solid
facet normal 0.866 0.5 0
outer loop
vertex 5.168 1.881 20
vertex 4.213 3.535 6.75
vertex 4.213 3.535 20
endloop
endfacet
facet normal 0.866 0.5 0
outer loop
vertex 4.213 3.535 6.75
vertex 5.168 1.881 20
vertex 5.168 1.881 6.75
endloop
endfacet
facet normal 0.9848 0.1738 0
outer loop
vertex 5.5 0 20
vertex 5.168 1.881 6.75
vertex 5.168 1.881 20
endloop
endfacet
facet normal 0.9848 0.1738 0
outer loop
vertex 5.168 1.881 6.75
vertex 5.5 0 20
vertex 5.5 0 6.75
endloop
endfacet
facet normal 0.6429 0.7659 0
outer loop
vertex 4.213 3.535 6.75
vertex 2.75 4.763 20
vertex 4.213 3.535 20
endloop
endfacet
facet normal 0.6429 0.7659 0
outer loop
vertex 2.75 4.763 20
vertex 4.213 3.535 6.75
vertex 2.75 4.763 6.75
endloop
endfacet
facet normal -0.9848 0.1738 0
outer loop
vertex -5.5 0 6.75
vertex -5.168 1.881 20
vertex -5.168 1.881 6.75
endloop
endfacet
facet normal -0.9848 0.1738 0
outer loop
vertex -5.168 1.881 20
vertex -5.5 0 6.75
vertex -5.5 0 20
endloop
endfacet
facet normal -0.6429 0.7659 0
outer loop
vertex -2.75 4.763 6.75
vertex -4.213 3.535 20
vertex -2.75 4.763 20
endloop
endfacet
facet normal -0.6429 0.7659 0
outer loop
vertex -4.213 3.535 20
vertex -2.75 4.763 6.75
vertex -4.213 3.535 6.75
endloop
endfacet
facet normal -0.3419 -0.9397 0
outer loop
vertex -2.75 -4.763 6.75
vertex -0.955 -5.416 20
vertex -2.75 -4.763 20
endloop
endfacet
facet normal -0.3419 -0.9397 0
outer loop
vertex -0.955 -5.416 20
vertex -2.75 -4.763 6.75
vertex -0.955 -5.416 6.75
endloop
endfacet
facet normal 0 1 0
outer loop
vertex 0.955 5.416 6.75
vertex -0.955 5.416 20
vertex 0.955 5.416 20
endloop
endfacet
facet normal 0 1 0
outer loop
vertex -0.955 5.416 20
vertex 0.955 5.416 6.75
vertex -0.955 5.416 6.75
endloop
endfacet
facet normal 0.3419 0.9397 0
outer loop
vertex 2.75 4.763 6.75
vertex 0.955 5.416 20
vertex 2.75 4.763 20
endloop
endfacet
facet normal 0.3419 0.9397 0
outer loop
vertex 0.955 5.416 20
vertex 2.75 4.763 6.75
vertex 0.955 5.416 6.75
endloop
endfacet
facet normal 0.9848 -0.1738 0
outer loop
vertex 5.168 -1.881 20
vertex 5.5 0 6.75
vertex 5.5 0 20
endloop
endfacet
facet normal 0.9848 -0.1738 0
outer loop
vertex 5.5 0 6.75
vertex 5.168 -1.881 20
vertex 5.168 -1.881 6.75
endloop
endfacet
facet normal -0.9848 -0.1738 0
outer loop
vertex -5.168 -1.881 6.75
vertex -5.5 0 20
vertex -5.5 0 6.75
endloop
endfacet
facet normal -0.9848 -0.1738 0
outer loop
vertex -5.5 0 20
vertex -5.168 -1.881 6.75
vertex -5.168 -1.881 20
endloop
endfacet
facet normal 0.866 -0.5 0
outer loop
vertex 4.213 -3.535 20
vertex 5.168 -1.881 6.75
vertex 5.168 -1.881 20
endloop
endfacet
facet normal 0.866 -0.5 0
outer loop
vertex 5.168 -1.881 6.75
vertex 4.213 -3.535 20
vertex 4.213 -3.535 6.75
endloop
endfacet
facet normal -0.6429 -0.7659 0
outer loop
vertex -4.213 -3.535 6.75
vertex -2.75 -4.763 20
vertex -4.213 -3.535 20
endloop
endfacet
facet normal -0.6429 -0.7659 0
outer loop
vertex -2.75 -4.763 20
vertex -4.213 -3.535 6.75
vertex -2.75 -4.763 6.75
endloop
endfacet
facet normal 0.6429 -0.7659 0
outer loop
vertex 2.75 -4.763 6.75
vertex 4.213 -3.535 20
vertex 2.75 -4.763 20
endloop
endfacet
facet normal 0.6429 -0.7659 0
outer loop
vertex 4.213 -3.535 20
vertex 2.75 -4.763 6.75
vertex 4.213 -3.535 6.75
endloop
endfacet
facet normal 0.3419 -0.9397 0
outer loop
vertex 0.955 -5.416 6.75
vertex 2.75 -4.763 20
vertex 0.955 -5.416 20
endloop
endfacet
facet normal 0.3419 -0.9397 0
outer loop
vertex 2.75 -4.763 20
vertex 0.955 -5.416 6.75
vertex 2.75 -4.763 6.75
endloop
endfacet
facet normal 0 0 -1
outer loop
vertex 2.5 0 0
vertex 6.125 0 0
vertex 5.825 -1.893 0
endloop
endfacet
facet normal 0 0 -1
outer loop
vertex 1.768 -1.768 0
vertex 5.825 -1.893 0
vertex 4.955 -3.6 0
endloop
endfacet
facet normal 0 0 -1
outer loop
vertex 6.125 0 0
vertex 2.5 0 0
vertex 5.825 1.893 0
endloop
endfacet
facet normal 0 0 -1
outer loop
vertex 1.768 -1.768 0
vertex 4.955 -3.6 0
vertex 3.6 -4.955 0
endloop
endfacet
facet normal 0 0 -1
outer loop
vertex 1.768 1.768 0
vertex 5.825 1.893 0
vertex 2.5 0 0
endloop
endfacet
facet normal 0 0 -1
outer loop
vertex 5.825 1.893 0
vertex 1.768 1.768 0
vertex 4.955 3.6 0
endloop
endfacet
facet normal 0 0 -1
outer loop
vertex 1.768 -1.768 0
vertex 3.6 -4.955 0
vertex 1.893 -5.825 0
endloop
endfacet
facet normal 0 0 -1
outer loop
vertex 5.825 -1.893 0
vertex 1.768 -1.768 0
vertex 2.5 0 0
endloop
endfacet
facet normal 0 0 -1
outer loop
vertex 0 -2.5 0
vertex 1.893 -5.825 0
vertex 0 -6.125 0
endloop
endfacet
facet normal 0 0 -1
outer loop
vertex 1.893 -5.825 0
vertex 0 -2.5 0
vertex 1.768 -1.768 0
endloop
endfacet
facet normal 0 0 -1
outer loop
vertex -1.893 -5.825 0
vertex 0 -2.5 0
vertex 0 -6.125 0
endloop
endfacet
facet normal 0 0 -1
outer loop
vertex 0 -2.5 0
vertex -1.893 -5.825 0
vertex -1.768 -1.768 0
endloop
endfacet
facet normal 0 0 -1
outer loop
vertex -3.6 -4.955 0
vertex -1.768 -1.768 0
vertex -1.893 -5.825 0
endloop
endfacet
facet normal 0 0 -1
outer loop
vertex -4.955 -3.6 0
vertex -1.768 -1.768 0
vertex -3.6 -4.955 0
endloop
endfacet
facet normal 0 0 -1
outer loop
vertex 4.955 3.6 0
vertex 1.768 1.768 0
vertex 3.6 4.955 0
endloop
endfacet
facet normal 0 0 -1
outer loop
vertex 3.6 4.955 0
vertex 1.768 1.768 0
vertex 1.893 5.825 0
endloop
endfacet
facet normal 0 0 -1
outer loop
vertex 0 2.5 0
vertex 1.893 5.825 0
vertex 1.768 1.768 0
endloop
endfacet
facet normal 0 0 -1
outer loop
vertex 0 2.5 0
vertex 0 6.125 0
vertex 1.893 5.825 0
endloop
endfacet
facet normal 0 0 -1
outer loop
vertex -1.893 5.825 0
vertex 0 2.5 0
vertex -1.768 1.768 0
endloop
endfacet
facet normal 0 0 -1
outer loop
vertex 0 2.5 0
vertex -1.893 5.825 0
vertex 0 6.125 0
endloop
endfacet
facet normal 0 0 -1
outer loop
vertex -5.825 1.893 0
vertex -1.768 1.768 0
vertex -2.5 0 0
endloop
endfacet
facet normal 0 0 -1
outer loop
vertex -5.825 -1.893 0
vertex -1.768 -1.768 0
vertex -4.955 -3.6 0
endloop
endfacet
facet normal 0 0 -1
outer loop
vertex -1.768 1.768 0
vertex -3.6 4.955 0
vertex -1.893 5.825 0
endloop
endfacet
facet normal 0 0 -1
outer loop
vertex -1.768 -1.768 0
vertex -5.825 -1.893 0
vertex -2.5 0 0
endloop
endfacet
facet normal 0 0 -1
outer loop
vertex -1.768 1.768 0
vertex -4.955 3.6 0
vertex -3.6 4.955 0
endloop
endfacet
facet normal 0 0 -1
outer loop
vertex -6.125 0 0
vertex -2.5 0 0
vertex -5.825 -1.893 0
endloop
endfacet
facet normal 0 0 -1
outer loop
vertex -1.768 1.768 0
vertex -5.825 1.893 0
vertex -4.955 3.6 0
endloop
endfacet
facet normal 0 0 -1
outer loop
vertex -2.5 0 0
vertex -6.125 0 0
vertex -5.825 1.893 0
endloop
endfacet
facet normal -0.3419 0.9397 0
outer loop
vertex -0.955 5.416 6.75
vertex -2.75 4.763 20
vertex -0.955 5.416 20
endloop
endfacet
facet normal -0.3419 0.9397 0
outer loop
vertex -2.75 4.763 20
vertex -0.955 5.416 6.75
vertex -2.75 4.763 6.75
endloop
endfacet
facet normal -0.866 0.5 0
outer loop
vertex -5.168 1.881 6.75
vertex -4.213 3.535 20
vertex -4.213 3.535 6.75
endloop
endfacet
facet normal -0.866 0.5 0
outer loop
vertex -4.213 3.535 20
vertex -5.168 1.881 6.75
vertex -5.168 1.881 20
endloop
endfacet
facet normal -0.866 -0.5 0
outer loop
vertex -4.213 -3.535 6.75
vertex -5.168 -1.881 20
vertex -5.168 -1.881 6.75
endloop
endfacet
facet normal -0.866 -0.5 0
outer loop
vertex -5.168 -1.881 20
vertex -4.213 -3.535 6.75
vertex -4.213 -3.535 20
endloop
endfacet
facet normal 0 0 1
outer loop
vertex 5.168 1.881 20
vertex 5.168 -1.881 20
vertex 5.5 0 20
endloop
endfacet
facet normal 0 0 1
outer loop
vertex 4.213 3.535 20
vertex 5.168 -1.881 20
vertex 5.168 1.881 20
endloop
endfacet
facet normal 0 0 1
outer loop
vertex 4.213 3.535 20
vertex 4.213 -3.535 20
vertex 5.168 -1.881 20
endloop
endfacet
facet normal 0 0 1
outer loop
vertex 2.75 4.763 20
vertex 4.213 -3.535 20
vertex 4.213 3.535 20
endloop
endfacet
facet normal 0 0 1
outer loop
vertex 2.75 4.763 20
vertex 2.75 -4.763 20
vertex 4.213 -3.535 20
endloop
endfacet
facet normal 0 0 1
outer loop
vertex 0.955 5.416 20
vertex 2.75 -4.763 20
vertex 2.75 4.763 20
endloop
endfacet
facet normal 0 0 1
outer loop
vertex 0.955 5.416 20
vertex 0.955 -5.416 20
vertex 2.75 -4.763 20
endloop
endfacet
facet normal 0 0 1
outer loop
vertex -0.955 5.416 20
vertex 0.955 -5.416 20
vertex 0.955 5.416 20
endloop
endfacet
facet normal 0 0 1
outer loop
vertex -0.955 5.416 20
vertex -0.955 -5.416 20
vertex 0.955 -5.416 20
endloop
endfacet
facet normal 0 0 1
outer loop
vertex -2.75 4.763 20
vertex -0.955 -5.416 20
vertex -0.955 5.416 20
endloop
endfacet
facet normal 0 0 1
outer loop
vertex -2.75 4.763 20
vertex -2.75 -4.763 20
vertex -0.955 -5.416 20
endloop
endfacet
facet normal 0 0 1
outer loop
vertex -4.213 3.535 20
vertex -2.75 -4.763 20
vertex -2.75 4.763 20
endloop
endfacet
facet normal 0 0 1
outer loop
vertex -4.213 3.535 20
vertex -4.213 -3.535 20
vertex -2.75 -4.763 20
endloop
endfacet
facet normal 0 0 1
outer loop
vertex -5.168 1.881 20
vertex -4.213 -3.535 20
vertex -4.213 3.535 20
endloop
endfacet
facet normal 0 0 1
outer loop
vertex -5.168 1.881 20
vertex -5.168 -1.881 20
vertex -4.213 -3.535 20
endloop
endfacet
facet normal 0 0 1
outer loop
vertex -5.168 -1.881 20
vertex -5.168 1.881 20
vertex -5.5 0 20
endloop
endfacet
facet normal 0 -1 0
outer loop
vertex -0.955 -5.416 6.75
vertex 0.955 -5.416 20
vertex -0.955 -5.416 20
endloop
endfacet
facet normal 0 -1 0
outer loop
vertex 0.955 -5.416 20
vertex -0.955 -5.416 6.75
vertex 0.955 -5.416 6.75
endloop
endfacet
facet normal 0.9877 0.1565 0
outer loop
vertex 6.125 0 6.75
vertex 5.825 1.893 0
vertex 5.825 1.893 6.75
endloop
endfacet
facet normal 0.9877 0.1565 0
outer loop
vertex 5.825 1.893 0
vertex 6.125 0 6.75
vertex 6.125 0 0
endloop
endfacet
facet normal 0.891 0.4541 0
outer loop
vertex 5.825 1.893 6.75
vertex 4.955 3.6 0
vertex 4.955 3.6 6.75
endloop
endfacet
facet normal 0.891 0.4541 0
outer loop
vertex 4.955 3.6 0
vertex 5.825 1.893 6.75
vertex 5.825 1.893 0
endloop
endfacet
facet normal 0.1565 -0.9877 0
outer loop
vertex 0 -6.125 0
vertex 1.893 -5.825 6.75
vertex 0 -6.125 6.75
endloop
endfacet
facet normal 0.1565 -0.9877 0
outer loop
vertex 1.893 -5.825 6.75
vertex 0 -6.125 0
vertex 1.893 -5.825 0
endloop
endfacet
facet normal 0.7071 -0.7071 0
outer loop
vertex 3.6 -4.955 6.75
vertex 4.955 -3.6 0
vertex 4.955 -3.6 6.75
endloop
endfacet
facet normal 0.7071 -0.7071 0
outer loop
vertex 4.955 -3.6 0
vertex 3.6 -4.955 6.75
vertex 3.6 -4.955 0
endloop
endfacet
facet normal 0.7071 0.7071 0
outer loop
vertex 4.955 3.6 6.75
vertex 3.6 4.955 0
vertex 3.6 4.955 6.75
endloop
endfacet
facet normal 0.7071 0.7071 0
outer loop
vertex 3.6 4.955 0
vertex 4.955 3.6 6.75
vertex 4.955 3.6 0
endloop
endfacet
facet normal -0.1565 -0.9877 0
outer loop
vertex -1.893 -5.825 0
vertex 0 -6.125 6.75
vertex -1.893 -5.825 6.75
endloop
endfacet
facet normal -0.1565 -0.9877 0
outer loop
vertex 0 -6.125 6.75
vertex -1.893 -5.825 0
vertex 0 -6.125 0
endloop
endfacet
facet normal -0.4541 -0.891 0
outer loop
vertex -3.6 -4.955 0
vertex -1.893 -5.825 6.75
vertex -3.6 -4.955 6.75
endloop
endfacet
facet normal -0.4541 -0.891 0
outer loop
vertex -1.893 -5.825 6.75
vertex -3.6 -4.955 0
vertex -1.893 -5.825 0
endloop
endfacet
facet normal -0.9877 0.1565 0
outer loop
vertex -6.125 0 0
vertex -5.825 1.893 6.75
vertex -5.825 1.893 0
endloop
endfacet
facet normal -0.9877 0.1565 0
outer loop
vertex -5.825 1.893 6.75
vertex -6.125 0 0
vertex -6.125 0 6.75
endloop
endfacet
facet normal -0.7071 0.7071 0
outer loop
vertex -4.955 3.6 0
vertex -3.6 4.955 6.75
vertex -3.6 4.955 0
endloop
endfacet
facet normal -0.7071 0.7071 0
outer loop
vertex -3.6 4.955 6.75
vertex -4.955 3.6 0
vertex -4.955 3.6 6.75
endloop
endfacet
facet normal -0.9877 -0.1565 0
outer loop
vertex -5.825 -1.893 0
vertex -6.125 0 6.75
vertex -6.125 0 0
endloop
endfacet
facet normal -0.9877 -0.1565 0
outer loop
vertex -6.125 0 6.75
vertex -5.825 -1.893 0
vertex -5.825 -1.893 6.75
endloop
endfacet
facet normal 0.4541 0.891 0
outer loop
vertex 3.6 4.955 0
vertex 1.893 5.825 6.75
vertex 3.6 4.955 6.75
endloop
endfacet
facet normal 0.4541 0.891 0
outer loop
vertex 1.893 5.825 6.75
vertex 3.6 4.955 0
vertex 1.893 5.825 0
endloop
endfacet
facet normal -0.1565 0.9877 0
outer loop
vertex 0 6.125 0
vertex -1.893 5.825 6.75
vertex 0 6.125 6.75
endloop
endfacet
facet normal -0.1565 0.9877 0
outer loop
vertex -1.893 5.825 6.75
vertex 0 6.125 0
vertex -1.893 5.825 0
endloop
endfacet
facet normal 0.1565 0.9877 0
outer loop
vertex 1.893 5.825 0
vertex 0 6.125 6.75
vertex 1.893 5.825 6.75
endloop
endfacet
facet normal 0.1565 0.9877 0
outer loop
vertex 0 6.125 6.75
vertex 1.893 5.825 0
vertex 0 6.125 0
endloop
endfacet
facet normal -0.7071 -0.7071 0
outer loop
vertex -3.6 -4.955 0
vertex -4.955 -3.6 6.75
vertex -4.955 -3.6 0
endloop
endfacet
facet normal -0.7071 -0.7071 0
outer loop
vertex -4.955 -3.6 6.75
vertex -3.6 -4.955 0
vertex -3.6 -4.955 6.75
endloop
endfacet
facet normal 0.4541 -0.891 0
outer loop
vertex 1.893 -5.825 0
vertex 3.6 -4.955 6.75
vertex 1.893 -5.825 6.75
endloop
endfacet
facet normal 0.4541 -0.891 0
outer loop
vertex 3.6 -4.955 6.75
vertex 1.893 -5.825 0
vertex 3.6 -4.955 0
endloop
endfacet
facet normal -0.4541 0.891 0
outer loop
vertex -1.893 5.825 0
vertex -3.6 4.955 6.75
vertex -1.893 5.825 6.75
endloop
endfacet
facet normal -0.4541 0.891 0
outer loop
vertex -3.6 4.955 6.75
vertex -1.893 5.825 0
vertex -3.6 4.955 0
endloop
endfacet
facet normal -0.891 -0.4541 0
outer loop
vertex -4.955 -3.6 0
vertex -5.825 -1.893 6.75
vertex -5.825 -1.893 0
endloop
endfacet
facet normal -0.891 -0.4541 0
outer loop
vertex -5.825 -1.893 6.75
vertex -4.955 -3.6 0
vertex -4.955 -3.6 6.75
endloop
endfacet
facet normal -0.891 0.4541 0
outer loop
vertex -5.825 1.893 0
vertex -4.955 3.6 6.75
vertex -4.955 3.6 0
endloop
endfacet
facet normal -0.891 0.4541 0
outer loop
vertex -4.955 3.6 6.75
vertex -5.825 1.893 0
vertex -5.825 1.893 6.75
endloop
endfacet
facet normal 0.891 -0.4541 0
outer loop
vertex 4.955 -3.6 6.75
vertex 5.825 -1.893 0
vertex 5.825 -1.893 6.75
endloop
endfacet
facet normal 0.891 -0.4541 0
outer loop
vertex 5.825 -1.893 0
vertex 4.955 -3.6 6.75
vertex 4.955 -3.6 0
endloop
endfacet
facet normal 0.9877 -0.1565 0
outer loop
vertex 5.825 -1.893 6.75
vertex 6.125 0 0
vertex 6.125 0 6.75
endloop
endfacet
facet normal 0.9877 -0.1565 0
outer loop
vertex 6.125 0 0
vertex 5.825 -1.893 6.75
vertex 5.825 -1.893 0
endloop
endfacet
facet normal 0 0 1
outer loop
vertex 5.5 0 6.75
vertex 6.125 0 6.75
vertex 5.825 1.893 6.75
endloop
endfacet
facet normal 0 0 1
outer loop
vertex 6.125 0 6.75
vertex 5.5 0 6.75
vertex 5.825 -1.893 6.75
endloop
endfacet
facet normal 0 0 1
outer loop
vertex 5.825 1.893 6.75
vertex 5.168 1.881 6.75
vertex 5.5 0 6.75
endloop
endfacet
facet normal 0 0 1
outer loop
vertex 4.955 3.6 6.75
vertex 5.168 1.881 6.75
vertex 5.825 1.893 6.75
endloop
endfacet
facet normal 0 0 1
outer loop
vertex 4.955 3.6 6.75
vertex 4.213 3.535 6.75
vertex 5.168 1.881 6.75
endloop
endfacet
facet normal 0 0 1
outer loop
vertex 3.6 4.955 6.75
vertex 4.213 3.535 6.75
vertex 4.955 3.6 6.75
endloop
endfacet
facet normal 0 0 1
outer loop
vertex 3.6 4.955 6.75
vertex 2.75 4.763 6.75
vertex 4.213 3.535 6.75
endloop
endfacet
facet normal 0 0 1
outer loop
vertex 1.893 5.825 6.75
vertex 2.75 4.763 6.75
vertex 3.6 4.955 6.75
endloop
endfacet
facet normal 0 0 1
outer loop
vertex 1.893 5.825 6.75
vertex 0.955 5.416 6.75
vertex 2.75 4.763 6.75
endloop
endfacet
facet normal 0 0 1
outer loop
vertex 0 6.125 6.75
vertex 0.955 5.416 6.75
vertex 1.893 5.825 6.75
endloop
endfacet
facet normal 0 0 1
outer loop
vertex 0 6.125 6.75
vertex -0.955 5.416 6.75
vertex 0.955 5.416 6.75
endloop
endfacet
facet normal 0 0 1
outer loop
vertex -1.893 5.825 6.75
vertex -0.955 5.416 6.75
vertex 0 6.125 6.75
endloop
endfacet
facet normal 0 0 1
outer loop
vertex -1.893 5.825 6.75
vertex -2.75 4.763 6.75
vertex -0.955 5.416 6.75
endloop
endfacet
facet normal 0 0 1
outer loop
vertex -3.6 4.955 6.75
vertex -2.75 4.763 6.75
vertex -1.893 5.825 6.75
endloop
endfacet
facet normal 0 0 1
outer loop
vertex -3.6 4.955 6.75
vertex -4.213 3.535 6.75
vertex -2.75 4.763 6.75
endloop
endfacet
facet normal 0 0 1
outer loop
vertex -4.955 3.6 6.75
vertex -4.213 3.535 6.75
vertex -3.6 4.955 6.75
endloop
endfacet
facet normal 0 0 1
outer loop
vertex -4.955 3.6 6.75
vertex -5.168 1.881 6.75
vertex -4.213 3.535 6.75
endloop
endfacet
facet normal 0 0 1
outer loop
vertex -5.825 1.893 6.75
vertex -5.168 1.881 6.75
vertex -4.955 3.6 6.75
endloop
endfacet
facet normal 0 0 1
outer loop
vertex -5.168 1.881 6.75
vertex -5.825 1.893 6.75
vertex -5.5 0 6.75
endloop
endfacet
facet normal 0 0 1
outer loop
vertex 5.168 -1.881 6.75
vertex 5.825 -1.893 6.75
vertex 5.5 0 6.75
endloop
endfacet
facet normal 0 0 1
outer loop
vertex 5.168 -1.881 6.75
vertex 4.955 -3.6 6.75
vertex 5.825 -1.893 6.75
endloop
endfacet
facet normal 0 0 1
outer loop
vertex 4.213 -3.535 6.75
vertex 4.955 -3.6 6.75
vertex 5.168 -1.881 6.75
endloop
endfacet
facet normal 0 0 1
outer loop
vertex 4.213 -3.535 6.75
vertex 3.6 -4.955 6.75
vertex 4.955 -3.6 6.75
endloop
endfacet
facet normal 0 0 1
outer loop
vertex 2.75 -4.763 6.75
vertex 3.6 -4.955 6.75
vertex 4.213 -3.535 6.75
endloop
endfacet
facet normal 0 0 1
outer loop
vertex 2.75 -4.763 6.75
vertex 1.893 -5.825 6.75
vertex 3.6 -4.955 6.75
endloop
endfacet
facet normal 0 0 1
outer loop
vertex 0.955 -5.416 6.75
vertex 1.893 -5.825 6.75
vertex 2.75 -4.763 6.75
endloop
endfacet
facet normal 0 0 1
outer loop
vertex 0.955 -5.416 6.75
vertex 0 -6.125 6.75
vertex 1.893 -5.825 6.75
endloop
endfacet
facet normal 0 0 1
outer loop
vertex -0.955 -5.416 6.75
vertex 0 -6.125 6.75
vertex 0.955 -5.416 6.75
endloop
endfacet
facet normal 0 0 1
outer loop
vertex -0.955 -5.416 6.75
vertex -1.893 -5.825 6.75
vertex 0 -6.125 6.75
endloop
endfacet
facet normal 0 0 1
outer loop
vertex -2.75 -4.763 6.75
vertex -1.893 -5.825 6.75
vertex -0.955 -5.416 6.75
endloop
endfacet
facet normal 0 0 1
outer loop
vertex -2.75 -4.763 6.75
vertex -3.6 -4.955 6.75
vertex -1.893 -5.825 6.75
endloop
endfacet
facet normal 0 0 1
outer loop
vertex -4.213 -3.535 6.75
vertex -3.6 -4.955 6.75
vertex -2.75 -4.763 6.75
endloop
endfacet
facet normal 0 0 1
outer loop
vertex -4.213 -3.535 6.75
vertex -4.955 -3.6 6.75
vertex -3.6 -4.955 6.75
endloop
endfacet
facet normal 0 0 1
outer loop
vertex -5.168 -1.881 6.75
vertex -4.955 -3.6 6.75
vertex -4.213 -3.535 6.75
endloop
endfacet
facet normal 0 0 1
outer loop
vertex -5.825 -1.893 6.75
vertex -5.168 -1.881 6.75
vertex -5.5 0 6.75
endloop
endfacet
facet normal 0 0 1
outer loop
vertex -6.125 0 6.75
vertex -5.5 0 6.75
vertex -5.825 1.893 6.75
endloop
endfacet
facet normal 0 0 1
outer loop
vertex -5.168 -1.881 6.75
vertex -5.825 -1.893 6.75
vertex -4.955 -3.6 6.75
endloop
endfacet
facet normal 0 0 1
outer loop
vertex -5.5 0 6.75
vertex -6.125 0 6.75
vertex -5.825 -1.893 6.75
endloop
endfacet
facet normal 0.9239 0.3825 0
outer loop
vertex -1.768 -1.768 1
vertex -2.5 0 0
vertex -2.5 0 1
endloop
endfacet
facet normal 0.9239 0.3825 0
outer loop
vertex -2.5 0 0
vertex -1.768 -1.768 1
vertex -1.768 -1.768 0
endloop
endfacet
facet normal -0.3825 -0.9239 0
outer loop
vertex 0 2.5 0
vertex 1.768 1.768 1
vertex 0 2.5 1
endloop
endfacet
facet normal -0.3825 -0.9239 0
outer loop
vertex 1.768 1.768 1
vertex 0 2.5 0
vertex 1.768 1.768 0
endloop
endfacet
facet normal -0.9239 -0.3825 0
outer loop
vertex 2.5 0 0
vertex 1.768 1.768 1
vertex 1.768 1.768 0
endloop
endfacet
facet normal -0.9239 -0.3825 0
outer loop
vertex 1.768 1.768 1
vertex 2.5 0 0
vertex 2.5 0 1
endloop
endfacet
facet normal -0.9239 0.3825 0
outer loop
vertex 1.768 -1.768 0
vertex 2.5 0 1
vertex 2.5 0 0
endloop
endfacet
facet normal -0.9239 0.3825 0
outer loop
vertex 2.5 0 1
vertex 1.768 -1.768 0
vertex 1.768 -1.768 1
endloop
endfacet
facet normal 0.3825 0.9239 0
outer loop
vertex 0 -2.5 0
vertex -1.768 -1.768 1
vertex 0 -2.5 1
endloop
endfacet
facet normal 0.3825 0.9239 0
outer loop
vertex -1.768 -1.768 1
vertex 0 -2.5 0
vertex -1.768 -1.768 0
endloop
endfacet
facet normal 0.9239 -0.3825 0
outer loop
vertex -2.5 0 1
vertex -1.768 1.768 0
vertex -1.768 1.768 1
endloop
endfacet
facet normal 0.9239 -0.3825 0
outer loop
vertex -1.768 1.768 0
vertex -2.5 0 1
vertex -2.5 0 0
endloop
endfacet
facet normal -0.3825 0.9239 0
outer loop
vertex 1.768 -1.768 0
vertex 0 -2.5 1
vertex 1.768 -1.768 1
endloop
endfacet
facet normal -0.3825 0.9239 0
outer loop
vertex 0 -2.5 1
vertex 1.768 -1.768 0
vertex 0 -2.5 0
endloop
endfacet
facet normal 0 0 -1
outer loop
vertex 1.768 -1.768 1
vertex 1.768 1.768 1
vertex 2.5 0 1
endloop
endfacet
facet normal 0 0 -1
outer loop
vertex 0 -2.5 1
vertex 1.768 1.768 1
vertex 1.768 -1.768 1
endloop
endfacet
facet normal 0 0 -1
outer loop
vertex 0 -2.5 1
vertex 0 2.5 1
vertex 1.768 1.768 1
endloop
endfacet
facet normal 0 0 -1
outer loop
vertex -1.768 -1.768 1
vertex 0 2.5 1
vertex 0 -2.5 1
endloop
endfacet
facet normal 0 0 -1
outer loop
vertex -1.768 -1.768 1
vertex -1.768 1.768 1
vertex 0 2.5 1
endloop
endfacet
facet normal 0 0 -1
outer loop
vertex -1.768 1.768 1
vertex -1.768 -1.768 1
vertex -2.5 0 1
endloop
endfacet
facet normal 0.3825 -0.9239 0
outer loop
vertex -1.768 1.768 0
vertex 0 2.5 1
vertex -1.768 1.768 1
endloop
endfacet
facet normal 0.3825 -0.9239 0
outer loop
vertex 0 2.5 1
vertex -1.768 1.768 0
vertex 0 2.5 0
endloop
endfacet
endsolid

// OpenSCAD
module make_laser_03015L(buffer=0){
    difference(){
        union(){
            cylinder(d=11+buffer, h=20, center=false);
            cylinder(d=12.25, h=6.75, center=false);
        }
        translate([0,0,-1])
        cylinder(d=5, h=2, center=false);
    }
}

make_laser_03015L();
